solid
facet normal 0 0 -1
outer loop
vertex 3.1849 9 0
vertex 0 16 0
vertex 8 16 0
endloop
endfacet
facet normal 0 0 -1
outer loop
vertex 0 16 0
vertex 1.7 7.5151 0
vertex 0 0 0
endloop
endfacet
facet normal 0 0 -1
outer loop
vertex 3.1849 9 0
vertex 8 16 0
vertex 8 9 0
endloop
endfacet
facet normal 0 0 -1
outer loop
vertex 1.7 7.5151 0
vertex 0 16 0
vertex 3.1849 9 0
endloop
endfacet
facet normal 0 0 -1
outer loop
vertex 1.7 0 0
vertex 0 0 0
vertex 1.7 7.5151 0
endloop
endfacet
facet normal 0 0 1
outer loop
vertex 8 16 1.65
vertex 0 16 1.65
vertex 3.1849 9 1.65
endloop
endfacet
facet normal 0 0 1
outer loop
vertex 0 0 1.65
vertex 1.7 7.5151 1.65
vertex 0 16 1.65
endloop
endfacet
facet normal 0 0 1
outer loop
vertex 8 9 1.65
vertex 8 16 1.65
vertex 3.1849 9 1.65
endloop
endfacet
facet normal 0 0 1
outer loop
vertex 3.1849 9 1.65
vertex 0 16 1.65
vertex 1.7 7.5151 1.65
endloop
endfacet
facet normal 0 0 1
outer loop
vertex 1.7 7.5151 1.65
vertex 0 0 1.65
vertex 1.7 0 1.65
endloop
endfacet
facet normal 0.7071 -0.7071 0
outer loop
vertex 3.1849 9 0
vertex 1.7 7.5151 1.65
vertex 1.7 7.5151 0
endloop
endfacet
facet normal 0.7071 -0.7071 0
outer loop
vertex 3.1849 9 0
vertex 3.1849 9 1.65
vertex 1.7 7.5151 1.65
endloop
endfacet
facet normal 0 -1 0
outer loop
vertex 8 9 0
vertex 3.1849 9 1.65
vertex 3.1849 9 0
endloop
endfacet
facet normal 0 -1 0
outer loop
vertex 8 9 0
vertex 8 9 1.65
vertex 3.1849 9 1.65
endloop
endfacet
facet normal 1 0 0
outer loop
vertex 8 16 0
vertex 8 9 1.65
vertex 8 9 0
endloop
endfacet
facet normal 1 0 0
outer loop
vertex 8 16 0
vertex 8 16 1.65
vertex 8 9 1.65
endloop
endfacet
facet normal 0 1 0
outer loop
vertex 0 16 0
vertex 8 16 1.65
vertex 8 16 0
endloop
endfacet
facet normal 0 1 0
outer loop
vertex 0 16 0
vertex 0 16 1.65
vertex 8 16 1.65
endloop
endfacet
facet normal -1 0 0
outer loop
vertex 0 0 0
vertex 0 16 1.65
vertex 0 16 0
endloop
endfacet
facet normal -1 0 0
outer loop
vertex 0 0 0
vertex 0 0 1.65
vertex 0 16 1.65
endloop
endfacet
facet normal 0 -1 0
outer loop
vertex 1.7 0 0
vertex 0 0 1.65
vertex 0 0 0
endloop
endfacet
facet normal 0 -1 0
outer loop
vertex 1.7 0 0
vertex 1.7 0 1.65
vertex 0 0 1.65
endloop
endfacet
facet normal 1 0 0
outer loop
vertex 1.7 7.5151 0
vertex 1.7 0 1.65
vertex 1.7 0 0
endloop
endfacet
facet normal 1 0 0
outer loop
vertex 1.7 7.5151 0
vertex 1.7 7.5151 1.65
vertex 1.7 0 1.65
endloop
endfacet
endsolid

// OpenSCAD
// Use 0.15mm layers.
linear_extrude(1.65) {
  square([1.7, 16]);

  translate([0, 9])
  square([8, 7]);
  
  translate([1.7, 9])
  rotate([0, 0, 45])
  square(2.1, center=true);
}
